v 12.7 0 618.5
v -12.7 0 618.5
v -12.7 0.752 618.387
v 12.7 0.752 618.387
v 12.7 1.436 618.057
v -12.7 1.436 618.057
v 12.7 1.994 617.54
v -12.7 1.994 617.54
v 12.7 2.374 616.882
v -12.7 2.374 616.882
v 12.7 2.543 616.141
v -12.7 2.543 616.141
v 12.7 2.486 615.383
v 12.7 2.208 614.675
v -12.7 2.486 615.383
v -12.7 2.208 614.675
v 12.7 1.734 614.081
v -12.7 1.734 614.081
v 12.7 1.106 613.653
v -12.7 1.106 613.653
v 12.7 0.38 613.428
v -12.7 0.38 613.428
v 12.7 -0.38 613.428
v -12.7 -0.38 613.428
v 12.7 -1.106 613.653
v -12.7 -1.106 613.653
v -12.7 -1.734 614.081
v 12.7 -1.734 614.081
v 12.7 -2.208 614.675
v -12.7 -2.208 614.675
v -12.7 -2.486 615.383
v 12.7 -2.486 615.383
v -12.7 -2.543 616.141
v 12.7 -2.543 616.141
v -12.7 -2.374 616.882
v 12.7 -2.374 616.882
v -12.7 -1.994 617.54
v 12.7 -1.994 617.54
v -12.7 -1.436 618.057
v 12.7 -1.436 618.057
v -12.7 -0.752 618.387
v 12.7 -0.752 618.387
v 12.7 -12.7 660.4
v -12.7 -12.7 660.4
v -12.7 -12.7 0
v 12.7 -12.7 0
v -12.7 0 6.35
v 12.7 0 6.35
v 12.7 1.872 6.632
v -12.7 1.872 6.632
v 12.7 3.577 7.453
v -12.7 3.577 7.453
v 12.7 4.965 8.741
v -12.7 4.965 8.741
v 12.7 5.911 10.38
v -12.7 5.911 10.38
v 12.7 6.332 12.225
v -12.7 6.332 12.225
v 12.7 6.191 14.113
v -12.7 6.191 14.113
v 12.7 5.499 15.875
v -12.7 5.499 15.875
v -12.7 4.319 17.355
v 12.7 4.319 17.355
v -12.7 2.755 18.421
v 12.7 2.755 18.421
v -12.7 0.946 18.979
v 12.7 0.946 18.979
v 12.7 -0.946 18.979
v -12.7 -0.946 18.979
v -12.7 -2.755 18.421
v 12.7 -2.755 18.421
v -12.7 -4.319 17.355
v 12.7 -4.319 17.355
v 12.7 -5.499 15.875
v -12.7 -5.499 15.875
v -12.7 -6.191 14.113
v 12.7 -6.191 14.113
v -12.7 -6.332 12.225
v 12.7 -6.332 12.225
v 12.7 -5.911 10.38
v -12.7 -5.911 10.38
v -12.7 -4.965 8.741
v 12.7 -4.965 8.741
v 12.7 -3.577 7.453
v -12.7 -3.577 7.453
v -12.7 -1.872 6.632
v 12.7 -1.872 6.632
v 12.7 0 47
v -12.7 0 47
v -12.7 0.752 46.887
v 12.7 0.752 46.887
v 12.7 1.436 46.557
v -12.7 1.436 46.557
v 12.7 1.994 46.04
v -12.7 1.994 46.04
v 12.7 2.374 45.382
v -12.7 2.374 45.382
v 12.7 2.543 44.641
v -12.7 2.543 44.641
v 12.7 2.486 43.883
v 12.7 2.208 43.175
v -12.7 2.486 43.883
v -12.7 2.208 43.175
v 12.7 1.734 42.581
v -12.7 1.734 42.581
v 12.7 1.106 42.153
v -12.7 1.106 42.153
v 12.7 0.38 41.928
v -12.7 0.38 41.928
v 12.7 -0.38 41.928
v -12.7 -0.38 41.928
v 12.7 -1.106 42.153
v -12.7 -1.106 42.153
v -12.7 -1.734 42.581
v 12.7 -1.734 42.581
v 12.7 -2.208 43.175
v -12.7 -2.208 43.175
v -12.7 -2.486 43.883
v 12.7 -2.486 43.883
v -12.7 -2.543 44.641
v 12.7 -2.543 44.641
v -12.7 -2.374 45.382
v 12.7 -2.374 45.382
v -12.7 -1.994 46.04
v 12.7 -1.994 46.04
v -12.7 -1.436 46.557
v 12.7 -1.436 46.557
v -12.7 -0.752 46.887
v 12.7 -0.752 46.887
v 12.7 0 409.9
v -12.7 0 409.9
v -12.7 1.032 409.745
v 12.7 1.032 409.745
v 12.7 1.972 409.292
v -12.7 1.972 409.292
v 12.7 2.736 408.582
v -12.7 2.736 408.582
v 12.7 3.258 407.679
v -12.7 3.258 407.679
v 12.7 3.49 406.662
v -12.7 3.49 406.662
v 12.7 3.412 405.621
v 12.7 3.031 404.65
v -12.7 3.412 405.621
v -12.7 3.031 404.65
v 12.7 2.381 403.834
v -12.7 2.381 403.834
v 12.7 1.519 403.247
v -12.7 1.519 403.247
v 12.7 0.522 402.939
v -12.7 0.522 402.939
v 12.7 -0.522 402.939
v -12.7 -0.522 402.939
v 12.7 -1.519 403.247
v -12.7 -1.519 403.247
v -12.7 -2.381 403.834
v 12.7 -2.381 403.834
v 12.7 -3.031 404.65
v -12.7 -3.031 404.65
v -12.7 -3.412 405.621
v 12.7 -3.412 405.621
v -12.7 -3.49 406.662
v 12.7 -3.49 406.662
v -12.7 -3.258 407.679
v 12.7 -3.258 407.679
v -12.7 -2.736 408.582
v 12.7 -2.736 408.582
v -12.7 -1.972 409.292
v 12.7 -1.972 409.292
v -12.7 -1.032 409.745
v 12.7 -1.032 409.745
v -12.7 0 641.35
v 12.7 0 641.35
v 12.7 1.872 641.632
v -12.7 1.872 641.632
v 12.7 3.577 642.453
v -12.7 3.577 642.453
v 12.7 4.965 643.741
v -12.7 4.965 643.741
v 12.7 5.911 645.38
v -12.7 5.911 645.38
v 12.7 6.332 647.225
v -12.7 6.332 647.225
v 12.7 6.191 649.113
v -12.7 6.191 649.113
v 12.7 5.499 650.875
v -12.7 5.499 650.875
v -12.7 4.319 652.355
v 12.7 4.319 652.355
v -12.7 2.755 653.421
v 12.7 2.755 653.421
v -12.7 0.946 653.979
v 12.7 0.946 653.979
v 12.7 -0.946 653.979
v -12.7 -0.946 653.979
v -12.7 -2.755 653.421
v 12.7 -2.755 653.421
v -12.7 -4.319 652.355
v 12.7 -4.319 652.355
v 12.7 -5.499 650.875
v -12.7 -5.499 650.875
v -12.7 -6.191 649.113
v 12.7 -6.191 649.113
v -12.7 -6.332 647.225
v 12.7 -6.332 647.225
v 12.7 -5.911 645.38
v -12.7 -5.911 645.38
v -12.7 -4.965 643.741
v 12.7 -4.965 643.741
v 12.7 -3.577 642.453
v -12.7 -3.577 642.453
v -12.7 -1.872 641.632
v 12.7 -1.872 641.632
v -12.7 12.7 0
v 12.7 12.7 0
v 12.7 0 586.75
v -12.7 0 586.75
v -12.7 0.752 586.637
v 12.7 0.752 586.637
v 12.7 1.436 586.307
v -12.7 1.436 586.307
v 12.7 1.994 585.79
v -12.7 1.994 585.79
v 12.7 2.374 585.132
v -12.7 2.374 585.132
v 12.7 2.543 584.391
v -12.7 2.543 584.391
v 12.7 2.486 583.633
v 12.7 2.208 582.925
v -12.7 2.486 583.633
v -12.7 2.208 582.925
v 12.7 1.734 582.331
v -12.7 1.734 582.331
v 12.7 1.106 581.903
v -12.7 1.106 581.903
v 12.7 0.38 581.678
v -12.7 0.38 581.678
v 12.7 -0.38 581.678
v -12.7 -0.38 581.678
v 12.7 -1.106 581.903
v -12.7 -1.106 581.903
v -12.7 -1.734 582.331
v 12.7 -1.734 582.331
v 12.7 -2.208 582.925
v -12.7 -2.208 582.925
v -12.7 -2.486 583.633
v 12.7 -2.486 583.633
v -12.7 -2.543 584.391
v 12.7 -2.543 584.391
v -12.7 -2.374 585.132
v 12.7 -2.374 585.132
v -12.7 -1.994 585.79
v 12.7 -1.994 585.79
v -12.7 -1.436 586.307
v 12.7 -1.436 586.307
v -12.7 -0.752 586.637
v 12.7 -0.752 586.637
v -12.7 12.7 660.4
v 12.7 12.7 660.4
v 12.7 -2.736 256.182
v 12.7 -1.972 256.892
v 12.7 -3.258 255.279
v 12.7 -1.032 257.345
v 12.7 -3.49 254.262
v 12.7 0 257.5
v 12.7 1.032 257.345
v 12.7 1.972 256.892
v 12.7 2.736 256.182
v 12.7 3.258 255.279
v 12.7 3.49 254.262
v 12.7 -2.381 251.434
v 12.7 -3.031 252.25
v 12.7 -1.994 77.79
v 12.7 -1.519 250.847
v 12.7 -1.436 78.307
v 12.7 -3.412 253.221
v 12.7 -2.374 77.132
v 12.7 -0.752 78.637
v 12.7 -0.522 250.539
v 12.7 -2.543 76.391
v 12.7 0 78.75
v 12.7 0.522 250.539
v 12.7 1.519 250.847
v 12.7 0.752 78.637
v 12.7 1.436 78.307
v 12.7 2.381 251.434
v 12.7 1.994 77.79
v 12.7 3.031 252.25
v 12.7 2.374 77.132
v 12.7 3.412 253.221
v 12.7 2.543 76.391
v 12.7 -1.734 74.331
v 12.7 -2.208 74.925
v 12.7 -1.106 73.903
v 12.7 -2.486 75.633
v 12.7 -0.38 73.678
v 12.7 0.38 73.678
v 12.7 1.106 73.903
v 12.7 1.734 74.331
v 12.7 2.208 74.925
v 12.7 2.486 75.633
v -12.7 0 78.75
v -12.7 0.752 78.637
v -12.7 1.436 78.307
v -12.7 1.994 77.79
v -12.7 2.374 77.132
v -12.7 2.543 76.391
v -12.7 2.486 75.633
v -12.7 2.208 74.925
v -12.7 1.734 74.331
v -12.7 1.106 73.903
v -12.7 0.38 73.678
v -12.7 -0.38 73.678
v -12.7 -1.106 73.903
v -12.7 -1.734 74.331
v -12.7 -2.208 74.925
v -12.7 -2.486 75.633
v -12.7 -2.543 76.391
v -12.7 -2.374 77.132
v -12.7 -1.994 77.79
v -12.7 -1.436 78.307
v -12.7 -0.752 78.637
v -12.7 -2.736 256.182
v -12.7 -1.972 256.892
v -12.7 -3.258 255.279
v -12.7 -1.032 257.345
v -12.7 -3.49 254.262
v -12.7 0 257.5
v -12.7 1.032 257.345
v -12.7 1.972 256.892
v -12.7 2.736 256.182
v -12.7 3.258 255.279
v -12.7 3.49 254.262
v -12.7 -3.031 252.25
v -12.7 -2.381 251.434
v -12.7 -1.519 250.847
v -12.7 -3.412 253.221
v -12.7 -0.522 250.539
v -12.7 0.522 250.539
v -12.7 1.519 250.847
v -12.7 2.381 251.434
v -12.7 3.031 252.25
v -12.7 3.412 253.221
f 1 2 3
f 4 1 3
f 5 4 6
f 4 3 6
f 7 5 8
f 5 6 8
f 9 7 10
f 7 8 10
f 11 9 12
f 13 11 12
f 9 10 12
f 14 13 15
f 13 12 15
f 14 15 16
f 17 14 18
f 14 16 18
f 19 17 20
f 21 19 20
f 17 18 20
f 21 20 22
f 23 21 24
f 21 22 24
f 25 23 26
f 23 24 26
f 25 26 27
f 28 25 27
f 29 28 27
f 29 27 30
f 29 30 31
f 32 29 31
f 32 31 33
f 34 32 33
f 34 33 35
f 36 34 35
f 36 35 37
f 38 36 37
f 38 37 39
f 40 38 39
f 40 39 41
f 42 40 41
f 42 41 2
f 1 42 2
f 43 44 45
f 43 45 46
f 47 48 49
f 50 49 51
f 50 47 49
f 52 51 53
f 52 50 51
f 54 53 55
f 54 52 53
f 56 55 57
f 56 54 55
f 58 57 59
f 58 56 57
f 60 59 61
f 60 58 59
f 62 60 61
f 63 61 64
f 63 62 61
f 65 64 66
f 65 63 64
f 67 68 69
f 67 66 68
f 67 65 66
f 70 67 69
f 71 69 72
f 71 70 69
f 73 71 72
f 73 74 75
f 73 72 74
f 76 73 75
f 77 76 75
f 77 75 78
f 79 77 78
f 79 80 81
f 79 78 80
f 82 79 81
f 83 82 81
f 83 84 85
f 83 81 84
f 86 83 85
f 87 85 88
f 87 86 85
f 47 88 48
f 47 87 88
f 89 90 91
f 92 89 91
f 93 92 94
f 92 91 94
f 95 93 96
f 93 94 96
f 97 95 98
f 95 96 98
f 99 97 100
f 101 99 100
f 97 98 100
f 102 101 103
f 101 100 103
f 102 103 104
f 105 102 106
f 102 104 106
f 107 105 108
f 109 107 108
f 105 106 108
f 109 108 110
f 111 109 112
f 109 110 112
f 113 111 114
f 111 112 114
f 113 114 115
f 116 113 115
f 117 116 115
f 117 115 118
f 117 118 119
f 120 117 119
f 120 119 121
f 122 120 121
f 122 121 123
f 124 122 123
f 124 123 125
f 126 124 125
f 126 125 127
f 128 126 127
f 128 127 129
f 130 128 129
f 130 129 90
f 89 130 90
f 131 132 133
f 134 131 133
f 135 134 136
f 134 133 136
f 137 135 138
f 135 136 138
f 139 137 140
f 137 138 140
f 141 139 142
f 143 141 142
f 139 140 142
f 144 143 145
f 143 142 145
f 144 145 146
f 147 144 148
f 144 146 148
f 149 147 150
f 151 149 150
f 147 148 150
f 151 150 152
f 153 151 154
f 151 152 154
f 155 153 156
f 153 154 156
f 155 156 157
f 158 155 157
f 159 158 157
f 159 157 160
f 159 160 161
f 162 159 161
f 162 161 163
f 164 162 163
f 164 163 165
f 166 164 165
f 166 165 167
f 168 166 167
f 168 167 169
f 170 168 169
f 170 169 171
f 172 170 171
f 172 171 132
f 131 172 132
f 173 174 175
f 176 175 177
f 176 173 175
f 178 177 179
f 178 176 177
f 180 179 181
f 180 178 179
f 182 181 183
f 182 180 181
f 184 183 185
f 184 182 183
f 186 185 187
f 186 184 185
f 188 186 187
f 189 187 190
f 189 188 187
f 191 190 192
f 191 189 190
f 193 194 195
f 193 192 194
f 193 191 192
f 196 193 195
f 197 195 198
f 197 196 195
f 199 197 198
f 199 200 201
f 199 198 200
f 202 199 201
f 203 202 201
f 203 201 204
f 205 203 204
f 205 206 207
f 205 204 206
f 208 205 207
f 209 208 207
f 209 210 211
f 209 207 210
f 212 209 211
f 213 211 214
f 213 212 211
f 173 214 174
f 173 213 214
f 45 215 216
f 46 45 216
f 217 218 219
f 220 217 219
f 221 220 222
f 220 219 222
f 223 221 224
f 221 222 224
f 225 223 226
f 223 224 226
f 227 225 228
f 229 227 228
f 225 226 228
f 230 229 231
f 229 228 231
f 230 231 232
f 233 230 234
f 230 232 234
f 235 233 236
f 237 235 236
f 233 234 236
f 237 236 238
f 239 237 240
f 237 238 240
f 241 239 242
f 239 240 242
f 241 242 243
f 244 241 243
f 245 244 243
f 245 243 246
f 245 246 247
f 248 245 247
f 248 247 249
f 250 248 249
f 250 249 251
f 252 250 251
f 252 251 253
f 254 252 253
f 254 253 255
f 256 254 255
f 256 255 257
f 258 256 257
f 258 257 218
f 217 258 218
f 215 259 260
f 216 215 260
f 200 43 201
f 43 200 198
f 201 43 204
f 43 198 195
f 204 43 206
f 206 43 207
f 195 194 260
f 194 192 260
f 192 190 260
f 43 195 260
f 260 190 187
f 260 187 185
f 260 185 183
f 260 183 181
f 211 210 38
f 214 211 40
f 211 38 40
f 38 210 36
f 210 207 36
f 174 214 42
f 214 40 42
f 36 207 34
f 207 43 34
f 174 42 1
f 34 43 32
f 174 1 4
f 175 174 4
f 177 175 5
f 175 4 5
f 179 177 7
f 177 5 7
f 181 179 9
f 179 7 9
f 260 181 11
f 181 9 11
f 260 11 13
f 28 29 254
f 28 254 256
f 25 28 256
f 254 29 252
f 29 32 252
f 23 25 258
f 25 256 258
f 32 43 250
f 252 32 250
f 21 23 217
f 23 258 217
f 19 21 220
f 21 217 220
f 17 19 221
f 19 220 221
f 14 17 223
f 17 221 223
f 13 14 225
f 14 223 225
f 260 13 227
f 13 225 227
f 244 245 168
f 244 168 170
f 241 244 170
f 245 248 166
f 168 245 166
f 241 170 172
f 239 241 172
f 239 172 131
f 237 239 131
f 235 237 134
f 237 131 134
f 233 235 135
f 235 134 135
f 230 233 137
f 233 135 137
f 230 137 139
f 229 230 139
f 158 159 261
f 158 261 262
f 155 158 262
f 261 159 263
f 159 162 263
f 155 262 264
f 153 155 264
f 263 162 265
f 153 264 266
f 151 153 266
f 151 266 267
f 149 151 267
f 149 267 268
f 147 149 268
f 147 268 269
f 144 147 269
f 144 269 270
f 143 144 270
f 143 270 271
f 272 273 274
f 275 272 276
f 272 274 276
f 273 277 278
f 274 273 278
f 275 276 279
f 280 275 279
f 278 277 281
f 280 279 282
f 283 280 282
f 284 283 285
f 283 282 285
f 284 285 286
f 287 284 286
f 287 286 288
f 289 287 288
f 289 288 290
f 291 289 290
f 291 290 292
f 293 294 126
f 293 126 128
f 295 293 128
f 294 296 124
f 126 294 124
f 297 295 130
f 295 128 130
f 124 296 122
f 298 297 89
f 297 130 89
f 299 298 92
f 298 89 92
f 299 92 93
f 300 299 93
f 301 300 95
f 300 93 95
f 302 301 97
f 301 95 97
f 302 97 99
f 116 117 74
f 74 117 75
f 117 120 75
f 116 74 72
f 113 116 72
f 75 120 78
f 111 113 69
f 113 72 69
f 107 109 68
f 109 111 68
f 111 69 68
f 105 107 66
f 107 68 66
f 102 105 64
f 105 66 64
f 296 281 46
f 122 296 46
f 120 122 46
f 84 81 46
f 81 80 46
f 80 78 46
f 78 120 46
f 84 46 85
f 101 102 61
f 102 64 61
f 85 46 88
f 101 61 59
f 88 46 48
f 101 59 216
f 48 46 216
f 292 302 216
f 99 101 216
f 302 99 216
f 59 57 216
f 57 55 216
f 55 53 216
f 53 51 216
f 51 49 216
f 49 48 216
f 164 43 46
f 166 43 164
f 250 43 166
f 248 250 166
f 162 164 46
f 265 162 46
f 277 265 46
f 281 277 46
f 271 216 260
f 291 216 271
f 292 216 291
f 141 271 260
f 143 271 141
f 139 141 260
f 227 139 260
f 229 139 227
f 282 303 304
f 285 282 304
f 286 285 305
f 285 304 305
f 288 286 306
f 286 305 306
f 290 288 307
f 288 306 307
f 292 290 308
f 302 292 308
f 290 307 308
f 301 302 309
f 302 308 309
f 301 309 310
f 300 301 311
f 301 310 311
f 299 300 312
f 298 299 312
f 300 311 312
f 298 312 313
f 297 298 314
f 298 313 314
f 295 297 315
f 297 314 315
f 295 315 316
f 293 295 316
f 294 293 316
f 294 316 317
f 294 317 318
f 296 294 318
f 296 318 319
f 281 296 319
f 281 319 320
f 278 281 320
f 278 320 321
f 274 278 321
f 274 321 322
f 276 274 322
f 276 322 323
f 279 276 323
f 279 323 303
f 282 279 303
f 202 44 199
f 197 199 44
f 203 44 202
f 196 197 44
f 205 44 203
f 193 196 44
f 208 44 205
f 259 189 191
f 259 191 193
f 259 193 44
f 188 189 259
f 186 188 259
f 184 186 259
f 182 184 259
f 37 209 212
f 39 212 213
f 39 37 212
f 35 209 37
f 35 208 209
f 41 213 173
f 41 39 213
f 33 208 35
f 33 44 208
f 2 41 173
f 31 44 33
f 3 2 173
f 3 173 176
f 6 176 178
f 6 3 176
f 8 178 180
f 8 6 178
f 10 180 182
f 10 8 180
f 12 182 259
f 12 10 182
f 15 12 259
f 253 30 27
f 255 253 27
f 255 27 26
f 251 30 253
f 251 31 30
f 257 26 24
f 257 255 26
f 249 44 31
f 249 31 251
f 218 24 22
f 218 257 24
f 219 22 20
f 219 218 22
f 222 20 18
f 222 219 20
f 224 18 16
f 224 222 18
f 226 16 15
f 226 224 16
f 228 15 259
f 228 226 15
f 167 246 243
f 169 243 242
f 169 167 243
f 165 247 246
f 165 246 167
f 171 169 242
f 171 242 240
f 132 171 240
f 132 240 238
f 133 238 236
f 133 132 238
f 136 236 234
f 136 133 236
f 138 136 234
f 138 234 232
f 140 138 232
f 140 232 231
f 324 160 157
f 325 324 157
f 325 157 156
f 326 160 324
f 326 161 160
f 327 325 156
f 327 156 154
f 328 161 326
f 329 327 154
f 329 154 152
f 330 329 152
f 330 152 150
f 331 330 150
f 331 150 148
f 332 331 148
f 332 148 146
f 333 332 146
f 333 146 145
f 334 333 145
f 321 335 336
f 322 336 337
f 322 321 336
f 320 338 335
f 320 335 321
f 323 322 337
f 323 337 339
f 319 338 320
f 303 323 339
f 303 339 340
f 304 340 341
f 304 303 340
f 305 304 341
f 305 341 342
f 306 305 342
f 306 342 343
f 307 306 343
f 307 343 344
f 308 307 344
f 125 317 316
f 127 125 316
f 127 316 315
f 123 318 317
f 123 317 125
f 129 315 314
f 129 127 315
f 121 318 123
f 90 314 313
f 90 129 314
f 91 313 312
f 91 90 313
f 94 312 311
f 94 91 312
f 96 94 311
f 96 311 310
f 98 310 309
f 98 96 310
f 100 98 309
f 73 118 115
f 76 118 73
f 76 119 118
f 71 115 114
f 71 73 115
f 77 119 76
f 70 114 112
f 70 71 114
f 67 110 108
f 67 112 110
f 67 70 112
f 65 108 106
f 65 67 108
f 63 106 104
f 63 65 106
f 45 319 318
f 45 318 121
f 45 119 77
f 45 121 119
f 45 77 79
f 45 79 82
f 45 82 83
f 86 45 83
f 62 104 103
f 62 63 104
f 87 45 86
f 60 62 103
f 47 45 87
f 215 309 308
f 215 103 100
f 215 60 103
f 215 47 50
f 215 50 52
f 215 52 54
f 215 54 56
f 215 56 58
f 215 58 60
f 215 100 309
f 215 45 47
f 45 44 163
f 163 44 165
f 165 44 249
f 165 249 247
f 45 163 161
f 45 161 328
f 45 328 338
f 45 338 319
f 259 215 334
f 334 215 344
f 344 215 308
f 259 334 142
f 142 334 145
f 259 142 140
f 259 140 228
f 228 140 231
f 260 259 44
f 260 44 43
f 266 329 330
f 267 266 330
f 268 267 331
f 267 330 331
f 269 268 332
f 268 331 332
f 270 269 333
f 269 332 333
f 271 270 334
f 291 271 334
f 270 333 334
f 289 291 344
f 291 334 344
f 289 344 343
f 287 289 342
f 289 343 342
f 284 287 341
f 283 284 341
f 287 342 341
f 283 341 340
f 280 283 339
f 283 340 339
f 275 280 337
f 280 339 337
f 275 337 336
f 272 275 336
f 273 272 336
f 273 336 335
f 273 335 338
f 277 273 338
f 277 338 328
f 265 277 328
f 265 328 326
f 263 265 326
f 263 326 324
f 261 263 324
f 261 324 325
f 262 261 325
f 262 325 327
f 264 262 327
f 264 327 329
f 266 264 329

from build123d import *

# Parameters (mm, degrees)
SKETCH1_W               = 25.4
SKETCH1_H               = 25.4
BOSS_EXTRUDE1_DEPTH     = 660.4
SKETCH2_R               = 6.35
CUT_EXTRUDE4_DEPTH      = 26.4
CUT_EXTRUDE4_DEPTH_BACK = 1
SKETCH3_R               = 2.55
CUT_EXTRUDE5_DEPTH      = 26.4
SKETCH10_R              = 3.5
CUT_EXTRUDE6_DEPTH      = 26.4


with BuildPart() as part:
    # Sketch1 → Boss-Extrude1 (new body)
    with BuildSketch(Plane.XY):
        Rectangle(SKETCH1_W, SKETCH1_H)
    extrude(amount=BOSS_EXTRUDE1_DEPTH)

    # Sketch2 → Cut-Extrude4 (cut, two sides)
    with BuildSketch(Plane(origin=(-12.7, 0, 0), x_dir=(0, 0, -1), z_dir=(1, 0, 0))) as cut_extrude4_sk:
        with Locations((-12.7, 0)):
            Circle(SKETCH2_R)
        with Locations((-647.7, 0)):
            Circle(SKETCH2_R)
    extrude(amount=CUT_EXTRUDE4_DEPTH, mode=Mode.SUBTRACT)
    extrude(cut_extrude4_sk.sketch, amount=-CUT_EXTRUDE4_DEPTH_BACK, mode=Mode.SUBTRACT)

    # Sketch3 → Cut-Extrude5 (cut, through all)
    with BuildSketch(Plane.ZY.offset(12.7)):
        with Locations((584.2, 0)):
            Circle(SKETCH3_R)
        with Locations((76.2, 0)):
            Circle(SKETCH3_R)
        with Locations((615.95, 0)):
            Circle(SKETCH3_R)
        with Locations((44.45, 0)):
            Circle(SKETCH3_R)
    extrude(amount=-CUT_EXTRUDE5_DEPTH, mode=Mode.SUBTRACT)

    # Sketch10 → Cut-Extrude6 (cut, through all)
    with BuildSketch(Plane.ZY.offset(12.7)):
        with Locations((406.4, 0)):
            Circle(SKETCH10_R)
        with Locations((254, 0)):
            Circle(SKETCH10_R)
    extrude(amount=-CUT_EXTRUDE6_DEPTH, mode=Mode.SUBTRACT)


solid = part.part
